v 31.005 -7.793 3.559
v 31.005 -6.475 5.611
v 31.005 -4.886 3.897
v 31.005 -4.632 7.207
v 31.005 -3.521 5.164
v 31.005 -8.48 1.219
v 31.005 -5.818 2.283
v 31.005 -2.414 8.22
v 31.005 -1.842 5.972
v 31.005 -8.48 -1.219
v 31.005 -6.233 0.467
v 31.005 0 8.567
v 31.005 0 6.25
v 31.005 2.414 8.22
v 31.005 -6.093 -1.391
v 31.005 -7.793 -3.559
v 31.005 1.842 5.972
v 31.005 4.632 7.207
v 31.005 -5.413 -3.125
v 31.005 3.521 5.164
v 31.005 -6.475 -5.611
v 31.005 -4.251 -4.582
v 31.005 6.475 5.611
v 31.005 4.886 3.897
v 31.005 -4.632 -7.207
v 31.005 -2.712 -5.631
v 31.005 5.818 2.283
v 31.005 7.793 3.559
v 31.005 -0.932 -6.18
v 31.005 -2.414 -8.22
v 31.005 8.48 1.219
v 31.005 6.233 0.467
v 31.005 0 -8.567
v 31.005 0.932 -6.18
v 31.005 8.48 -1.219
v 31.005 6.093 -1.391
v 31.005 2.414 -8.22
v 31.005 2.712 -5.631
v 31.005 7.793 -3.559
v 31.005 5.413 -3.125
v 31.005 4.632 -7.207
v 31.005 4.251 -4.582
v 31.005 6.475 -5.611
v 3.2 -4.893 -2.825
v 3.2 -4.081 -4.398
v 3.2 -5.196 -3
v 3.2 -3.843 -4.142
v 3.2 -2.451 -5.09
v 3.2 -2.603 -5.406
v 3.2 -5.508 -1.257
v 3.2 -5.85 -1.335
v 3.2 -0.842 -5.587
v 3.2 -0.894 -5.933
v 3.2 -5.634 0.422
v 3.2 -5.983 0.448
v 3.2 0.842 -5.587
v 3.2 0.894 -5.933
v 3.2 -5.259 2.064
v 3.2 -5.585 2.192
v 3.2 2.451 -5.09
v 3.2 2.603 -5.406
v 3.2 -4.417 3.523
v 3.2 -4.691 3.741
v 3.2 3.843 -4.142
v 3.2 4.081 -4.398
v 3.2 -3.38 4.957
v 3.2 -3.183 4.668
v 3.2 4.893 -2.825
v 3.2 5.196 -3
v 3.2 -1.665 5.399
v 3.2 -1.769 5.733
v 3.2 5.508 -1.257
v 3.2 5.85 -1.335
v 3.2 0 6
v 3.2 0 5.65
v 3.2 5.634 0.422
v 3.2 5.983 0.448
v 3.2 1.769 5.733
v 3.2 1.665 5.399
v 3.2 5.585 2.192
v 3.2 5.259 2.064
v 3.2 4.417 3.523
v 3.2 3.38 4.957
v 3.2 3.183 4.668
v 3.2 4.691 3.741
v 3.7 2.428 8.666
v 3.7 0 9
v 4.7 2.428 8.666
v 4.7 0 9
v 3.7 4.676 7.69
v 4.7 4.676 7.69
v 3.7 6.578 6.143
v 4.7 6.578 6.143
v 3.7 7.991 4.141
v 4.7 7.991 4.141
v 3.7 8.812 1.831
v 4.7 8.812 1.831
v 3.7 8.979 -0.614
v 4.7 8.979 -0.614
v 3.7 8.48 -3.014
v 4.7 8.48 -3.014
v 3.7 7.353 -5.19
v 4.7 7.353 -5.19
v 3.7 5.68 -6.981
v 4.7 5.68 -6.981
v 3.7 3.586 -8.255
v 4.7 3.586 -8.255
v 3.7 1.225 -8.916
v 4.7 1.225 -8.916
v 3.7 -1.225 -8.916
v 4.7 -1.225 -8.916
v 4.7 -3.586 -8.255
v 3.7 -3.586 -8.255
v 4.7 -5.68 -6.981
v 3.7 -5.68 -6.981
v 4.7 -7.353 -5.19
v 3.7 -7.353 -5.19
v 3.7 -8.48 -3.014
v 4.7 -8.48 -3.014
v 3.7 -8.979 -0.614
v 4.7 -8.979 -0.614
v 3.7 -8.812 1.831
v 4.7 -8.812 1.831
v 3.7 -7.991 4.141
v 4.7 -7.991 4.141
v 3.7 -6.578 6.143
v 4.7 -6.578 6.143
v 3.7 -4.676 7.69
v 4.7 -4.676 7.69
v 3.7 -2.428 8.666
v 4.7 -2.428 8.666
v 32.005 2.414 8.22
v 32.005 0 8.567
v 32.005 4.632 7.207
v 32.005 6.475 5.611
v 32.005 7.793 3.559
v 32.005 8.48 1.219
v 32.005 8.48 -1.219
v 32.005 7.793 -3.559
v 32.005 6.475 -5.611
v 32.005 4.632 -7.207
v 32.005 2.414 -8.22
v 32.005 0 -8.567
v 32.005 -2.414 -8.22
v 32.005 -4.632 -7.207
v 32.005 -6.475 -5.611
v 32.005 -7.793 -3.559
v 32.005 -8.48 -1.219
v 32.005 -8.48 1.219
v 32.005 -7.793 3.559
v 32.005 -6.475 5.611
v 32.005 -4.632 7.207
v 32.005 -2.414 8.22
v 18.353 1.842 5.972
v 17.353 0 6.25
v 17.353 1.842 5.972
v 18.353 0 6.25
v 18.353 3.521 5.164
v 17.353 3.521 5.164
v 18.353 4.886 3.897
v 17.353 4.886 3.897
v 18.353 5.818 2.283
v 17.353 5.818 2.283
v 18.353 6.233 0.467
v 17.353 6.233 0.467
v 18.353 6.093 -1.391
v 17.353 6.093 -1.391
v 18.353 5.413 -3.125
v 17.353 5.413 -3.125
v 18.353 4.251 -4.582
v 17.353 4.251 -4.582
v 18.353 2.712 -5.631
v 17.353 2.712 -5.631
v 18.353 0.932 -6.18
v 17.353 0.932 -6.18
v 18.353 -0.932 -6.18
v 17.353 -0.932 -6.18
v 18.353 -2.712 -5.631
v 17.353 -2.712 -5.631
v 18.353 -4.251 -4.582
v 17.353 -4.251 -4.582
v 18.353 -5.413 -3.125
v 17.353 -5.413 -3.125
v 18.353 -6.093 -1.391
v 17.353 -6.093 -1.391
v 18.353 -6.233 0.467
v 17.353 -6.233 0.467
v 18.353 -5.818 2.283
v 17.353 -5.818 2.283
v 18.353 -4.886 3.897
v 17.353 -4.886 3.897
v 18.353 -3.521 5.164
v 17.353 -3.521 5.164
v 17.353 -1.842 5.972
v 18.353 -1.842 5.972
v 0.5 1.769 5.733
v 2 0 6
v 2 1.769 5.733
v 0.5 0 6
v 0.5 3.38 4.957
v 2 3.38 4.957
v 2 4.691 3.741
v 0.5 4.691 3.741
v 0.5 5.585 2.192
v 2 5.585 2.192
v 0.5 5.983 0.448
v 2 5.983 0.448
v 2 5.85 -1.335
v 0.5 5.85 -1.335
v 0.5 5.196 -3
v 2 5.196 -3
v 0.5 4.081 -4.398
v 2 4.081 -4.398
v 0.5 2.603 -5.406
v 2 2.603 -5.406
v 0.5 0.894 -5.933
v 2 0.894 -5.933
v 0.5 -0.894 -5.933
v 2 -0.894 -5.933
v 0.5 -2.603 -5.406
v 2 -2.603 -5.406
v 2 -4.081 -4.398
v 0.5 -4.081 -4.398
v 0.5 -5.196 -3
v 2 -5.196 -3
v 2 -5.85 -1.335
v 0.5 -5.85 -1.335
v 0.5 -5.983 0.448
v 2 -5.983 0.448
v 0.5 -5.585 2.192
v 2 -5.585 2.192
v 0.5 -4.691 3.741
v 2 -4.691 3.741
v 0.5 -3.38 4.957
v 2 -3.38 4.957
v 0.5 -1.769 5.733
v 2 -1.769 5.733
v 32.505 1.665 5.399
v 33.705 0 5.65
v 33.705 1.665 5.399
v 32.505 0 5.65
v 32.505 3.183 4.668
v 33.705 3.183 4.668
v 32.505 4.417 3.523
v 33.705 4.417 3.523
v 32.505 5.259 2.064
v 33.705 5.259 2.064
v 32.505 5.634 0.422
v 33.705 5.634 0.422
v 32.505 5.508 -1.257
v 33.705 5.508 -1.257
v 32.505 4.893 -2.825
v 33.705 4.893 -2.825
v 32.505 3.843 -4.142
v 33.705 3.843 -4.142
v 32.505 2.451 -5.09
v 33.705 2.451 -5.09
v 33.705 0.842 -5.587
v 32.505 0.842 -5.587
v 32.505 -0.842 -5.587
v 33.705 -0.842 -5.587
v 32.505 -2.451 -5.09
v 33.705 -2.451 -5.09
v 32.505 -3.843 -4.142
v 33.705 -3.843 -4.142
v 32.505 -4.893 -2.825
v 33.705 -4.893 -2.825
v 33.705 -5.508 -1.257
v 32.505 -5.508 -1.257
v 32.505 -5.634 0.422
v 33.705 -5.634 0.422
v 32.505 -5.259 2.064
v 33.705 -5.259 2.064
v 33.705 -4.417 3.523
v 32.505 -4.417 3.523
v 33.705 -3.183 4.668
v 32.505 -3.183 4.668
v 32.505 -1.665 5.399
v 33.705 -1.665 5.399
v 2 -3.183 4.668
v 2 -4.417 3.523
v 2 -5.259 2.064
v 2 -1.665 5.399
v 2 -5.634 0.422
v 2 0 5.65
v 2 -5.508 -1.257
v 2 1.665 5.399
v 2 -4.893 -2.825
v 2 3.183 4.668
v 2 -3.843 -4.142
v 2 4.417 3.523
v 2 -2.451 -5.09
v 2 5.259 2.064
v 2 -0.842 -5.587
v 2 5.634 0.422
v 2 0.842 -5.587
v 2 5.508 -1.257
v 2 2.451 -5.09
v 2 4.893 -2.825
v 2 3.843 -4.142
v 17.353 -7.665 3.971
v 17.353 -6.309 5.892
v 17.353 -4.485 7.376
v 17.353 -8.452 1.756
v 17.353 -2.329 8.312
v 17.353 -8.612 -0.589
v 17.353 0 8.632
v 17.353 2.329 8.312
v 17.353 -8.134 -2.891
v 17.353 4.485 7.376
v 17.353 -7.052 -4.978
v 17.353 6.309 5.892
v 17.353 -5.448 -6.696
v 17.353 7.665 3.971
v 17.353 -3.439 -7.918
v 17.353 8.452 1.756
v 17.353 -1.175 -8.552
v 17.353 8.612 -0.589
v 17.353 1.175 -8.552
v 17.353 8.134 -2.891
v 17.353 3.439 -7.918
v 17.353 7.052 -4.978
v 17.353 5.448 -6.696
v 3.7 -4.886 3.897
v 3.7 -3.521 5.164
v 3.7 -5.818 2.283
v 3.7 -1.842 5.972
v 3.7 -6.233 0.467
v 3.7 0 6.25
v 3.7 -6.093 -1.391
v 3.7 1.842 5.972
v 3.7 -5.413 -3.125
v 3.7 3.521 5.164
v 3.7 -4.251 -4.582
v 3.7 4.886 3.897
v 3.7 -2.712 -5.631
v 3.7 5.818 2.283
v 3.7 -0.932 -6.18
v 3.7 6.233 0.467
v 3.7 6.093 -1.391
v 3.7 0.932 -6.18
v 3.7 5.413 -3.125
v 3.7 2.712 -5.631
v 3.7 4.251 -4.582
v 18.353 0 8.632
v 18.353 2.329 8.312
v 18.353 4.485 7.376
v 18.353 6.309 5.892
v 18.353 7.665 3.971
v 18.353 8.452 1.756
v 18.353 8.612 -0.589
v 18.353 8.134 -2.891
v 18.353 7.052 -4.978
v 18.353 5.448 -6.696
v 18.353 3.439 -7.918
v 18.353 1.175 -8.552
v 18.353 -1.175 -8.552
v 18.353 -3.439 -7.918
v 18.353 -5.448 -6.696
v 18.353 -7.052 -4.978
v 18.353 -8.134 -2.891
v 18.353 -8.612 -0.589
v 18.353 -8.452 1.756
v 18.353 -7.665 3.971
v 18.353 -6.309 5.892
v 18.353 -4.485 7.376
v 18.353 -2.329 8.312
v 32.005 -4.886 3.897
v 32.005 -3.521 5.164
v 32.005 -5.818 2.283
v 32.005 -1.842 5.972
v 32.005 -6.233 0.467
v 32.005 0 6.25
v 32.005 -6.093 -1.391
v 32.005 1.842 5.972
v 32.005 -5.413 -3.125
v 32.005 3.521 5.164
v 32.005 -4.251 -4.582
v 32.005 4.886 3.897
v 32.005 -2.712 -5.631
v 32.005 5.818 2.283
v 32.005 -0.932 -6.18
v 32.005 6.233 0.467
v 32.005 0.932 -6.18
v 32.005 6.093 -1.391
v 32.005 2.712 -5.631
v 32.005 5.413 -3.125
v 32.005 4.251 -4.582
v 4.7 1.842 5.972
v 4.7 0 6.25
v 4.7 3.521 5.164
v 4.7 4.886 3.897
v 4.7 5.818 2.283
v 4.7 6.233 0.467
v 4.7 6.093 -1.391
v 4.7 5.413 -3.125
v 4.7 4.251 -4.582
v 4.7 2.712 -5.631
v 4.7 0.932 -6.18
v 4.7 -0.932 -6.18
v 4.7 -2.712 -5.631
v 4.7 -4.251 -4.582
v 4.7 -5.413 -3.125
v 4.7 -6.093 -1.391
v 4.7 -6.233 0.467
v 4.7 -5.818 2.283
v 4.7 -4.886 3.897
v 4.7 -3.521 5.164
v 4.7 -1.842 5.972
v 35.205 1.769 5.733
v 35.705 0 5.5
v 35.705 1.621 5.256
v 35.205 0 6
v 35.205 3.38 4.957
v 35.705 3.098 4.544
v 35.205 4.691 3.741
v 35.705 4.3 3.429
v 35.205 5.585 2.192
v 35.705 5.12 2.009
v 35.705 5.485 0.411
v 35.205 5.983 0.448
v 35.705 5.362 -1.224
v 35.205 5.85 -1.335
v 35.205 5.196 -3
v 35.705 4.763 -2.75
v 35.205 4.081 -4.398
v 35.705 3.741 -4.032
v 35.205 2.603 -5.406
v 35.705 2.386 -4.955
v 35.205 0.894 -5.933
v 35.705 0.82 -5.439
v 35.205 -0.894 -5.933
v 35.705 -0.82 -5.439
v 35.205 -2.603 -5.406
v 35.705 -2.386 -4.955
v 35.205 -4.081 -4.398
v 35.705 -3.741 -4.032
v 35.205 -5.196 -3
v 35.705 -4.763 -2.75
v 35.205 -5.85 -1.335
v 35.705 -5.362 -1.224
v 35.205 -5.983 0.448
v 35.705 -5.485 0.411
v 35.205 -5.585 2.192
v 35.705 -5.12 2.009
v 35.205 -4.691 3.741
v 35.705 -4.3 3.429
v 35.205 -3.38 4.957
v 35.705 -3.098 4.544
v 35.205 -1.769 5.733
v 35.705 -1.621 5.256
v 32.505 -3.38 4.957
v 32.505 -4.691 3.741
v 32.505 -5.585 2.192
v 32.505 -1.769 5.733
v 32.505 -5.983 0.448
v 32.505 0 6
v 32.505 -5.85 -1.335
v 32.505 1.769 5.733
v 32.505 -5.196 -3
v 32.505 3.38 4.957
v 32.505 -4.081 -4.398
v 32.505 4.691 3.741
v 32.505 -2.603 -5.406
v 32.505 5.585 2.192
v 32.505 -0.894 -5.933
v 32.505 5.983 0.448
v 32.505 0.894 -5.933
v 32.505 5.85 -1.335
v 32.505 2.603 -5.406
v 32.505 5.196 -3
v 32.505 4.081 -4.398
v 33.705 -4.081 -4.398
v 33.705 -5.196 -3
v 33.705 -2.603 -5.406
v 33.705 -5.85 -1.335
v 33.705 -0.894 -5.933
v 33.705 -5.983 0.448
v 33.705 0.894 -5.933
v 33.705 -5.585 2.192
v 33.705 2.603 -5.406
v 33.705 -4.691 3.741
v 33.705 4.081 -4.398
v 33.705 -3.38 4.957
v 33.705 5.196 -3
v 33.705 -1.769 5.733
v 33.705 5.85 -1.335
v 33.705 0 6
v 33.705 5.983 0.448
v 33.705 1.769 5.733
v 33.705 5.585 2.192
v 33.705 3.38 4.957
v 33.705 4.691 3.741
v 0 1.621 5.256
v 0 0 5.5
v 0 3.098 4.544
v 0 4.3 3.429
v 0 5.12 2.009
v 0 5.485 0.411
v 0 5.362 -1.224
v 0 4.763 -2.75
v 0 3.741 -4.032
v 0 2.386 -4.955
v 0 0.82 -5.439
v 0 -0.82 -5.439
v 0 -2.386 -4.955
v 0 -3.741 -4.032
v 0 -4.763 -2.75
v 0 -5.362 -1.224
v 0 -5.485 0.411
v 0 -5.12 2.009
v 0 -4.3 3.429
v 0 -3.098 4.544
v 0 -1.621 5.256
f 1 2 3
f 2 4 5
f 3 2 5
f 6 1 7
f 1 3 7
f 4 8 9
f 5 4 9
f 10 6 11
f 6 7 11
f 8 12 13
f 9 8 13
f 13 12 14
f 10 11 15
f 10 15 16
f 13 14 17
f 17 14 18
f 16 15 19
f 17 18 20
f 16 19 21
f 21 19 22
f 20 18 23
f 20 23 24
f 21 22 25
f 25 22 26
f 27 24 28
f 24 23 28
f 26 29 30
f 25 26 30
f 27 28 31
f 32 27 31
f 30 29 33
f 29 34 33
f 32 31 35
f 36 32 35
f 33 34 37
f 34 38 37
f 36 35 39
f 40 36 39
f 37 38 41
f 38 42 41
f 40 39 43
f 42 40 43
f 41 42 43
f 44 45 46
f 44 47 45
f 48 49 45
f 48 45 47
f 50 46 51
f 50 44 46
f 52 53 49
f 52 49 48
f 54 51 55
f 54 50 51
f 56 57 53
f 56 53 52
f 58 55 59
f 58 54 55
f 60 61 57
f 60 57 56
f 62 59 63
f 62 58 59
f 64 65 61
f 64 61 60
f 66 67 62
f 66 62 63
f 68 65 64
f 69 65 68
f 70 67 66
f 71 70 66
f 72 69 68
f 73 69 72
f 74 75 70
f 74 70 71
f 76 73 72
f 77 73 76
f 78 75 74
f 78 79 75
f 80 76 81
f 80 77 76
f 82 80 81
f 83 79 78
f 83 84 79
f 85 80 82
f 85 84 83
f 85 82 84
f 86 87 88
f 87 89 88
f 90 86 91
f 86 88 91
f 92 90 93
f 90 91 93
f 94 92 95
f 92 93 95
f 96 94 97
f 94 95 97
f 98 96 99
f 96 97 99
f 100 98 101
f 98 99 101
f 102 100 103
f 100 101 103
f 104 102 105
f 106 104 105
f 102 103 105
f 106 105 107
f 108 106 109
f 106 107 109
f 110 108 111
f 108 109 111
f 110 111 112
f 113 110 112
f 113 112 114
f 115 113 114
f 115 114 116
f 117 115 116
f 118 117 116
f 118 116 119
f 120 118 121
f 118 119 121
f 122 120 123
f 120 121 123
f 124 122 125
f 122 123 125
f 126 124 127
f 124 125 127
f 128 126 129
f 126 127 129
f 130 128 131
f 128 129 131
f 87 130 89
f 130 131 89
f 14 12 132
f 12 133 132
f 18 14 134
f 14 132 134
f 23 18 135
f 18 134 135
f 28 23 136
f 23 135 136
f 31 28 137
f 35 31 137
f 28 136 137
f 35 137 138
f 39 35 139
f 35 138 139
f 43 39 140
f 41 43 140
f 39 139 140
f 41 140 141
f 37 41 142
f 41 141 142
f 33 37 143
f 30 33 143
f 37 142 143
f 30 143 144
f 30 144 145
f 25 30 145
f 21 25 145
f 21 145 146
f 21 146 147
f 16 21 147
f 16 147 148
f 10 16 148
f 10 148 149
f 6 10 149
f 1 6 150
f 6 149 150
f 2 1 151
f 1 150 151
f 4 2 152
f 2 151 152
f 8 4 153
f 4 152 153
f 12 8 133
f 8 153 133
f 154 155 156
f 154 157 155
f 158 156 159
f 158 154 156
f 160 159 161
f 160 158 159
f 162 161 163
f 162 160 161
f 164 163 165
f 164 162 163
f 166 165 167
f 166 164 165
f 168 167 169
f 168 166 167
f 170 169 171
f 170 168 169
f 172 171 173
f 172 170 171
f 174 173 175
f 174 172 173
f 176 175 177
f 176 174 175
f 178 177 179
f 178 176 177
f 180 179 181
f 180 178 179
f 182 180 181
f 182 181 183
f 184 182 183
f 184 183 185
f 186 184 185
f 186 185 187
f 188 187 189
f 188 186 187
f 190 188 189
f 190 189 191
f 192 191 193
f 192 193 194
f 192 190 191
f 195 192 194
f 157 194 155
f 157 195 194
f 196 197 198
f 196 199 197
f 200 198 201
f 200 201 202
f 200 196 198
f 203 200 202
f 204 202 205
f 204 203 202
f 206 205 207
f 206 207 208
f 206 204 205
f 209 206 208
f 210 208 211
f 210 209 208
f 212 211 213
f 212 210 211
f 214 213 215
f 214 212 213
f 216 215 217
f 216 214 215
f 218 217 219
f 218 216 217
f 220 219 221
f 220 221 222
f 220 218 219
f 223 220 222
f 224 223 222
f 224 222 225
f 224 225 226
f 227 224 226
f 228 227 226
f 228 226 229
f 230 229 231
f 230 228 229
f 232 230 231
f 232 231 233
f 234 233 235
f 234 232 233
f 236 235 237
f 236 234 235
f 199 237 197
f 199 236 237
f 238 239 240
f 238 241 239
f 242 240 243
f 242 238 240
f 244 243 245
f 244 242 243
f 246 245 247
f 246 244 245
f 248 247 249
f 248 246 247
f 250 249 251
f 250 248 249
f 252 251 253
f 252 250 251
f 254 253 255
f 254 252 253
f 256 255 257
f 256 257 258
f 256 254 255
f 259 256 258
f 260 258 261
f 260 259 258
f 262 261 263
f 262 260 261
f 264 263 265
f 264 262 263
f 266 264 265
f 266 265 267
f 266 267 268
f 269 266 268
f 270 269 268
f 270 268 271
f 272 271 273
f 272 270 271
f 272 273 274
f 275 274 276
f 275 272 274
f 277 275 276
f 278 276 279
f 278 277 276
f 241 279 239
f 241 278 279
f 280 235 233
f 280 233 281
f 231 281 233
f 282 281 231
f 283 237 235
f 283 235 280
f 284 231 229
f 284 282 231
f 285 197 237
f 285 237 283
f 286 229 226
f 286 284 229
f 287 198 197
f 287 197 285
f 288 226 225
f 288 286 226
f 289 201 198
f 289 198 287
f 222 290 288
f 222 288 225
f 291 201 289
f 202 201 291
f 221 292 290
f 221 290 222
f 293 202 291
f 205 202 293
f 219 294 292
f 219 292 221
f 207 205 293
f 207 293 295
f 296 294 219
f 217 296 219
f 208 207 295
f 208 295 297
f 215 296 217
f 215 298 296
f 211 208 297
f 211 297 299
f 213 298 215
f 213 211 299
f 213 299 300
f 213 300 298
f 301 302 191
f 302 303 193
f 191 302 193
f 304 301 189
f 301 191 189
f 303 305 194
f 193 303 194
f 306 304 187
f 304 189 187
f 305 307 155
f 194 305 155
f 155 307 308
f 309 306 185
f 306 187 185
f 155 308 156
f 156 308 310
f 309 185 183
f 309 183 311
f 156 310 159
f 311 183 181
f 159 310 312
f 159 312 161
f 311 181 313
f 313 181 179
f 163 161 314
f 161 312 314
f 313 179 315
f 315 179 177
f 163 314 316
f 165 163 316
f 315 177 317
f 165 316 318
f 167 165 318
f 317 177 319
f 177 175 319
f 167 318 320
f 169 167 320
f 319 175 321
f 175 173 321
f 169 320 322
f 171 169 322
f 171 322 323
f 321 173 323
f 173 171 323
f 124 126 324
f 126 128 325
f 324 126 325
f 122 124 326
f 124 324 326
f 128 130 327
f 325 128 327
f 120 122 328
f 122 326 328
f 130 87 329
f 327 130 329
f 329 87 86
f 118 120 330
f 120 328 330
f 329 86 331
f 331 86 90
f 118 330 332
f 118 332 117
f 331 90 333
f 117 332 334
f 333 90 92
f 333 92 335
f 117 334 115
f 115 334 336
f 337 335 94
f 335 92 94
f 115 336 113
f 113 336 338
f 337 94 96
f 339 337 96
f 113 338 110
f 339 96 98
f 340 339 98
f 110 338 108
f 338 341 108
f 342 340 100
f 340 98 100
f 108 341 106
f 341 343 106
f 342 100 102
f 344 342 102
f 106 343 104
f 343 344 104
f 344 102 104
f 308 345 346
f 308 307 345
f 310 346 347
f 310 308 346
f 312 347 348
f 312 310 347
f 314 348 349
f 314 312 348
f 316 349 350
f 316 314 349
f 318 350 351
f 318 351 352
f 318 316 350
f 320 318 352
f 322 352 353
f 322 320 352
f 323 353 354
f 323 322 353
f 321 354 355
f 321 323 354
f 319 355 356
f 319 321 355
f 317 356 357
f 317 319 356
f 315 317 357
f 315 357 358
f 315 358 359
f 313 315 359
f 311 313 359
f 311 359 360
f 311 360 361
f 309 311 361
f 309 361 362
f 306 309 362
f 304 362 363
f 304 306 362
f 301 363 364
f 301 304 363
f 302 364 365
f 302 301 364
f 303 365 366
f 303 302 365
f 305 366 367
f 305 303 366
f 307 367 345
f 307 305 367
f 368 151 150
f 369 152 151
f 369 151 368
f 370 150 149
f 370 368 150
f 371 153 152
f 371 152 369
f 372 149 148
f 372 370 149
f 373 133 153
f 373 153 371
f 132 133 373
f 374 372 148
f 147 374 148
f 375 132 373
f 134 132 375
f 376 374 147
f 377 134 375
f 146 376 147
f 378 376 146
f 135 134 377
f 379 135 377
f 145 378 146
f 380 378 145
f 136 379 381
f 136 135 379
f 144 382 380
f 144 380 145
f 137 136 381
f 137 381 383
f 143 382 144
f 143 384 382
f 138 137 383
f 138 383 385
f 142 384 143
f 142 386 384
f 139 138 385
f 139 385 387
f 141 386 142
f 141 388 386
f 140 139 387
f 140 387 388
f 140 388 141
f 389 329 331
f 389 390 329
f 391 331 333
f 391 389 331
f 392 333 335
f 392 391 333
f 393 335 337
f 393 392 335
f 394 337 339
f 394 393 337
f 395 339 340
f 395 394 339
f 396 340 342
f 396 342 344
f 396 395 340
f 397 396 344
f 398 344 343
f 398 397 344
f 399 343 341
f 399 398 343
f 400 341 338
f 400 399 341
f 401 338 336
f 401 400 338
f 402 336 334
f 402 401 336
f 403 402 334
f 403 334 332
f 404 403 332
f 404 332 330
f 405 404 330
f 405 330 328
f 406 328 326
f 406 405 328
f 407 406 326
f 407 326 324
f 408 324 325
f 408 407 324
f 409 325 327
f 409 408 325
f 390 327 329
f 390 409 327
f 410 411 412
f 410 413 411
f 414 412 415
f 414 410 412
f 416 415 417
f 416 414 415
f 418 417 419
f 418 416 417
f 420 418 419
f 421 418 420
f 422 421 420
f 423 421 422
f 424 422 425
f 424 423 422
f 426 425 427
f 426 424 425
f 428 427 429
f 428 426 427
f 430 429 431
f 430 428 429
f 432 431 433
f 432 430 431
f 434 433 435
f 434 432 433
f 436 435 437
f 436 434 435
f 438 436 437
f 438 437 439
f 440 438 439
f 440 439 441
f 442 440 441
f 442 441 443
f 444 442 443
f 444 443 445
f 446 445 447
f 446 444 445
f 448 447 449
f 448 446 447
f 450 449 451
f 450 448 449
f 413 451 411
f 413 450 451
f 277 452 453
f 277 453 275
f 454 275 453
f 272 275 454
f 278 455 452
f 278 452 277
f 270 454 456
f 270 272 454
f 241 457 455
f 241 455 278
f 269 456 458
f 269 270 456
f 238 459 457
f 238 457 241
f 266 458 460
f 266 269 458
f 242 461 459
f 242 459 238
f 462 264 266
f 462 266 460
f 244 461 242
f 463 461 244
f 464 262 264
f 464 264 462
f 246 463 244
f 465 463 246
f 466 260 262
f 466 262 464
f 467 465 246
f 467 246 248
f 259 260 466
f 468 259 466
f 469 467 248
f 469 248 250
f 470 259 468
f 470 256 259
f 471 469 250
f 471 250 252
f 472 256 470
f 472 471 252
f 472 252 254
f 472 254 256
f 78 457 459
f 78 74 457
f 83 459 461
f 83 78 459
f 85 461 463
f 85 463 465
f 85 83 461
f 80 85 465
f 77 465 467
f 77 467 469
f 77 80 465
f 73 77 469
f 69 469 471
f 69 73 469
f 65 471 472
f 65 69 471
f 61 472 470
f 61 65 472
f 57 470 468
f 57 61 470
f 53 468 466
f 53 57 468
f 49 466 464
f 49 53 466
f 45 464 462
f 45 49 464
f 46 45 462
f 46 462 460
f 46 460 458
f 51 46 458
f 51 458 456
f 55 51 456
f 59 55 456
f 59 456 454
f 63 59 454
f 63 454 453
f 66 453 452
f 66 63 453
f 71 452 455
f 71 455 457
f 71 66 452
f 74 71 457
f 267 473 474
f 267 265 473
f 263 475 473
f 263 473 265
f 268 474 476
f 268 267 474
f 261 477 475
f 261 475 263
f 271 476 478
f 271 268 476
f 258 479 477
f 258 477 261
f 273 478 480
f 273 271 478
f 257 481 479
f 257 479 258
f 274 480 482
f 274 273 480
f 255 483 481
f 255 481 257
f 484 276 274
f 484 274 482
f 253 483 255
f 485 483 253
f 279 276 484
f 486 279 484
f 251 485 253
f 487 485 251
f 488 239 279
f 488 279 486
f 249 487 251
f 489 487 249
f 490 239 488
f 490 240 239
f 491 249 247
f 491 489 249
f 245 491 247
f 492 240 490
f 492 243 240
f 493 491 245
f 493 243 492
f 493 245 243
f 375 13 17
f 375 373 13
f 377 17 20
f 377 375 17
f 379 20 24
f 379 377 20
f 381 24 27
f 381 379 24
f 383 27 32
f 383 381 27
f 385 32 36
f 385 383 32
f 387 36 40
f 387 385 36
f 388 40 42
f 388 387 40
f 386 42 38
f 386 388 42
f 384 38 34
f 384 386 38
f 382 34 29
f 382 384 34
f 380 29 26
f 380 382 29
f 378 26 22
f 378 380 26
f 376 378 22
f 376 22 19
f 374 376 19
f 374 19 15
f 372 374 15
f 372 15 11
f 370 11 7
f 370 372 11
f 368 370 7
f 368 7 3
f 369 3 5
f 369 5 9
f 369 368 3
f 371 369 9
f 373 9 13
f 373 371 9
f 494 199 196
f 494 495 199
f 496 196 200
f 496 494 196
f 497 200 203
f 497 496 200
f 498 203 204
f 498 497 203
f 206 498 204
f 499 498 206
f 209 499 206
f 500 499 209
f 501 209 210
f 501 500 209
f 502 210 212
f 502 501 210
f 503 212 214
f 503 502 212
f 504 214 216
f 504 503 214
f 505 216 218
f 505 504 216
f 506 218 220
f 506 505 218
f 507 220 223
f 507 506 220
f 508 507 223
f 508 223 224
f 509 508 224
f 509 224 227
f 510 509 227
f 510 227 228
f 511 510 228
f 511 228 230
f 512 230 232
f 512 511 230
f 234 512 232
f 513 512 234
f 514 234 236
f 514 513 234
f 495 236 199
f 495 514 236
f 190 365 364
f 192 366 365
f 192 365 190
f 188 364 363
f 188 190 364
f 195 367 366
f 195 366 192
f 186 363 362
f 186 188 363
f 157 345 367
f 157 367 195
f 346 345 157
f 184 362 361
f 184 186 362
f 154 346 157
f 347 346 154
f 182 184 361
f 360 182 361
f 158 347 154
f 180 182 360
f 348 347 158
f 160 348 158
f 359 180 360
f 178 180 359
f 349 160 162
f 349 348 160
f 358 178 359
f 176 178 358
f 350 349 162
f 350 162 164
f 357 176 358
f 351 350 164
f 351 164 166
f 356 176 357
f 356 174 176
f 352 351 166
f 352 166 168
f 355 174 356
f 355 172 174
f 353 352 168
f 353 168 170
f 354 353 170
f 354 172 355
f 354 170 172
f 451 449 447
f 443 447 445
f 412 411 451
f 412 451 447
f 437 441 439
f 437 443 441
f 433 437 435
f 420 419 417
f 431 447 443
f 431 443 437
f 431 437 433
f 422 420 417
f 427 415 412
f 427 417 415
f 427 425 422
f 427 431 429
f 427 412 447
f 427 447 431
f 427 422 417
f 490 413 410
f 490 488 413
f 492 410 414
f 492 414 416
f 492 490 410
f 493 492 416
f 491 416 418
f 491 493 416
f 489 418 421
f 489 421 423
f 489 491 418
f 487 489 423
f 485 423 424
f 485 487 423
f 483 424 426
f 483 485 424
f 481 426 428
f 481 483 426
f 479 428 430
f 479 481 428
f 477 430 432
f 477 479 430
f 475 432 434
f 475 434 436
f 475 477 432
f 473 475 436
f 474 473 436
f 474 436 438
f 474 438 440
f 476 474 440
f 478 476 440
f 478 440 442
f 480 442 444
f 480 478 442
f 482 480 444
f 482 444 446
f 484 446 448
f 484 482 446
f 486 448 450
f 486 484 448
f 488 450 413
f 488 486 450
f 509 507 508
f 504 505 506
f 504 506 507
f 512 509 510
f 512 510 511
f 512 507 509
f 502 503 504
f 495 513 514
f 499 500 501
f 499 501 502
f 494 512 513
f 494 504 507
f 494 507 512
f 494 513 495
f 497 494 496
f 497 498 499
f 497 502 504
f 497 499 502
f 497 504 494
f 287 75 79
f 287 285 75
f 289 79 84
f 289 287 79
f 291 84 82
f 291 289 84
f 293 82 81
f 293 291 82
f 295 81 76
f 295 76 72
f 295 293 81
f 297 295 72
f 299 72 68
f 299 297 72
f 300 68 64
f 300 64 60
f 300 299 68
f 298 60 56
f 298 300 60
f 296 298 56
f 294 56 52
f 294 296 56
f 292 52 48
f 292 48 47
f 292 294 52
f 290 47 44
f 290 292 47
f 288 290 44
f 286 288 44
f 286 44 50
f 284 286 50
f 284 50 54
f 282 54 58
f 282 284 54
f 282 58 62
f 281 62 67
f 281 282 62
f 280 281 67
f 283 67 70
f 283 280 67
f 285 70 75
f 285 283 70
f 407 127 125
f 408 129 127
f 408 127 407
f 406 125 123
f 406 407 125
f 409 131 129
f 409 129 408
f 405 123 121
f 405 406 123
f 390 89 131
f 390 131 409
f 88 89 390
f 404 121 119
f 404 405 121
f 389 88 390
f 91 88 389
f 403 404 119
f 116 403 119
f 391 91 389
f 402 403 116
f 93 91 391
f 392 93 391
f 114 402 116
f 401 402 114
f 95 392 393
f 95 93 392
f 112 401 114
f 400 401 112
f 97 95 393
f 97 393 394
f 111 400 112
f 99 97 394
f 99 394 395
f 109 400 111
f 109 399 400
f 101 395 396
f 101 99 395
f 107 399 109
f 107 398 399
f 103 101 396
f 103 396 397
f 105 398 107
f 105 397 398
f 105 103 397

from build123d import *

# Parameters (mm, degrees)
F0_W   = 1
F0_H   = 2.317471
F0_W_2 = 0.5
F0_H_2 = 2.382425
F0_H_3 = 2.75


with BuildPart() as f1:
    # F0 (on Front) → F1 (revolve)
    with BuildSketch(Plane.XZ):
        Polygon((2, 6), (0.5, 6), (0, 5.5), (0, 0), (19.005013, 0), (35.705013, 0), (35.705013, 5.5), (35.205013, 6), (33.705013, 6), (33.705013, 5.65), (32.505013, 5.65), (32.505013, 6), (19.005013, 6), (16.7, 6), (3.2, 6), (3.2, 5.65), (2, 5.65), align=None)
        with Locations((31.505013, 7.408735)):
            Rectangle(F0_W, F0_H)
        with Locations((18.102507, 7.441212)):
            Rectangle(F0_W_2, F0_H_2)
        with Locations((17.602507, 7.441212)):
            Rectangle(F0_W_2, F0_H_2)
        with Locations((4.2, 7.625)):
            Rectangle(F0_W, F0_H_3)
    revolve(axis=Axis((9.502507, 0, 0), (-1, 0, 0)))


solid = f1.part
